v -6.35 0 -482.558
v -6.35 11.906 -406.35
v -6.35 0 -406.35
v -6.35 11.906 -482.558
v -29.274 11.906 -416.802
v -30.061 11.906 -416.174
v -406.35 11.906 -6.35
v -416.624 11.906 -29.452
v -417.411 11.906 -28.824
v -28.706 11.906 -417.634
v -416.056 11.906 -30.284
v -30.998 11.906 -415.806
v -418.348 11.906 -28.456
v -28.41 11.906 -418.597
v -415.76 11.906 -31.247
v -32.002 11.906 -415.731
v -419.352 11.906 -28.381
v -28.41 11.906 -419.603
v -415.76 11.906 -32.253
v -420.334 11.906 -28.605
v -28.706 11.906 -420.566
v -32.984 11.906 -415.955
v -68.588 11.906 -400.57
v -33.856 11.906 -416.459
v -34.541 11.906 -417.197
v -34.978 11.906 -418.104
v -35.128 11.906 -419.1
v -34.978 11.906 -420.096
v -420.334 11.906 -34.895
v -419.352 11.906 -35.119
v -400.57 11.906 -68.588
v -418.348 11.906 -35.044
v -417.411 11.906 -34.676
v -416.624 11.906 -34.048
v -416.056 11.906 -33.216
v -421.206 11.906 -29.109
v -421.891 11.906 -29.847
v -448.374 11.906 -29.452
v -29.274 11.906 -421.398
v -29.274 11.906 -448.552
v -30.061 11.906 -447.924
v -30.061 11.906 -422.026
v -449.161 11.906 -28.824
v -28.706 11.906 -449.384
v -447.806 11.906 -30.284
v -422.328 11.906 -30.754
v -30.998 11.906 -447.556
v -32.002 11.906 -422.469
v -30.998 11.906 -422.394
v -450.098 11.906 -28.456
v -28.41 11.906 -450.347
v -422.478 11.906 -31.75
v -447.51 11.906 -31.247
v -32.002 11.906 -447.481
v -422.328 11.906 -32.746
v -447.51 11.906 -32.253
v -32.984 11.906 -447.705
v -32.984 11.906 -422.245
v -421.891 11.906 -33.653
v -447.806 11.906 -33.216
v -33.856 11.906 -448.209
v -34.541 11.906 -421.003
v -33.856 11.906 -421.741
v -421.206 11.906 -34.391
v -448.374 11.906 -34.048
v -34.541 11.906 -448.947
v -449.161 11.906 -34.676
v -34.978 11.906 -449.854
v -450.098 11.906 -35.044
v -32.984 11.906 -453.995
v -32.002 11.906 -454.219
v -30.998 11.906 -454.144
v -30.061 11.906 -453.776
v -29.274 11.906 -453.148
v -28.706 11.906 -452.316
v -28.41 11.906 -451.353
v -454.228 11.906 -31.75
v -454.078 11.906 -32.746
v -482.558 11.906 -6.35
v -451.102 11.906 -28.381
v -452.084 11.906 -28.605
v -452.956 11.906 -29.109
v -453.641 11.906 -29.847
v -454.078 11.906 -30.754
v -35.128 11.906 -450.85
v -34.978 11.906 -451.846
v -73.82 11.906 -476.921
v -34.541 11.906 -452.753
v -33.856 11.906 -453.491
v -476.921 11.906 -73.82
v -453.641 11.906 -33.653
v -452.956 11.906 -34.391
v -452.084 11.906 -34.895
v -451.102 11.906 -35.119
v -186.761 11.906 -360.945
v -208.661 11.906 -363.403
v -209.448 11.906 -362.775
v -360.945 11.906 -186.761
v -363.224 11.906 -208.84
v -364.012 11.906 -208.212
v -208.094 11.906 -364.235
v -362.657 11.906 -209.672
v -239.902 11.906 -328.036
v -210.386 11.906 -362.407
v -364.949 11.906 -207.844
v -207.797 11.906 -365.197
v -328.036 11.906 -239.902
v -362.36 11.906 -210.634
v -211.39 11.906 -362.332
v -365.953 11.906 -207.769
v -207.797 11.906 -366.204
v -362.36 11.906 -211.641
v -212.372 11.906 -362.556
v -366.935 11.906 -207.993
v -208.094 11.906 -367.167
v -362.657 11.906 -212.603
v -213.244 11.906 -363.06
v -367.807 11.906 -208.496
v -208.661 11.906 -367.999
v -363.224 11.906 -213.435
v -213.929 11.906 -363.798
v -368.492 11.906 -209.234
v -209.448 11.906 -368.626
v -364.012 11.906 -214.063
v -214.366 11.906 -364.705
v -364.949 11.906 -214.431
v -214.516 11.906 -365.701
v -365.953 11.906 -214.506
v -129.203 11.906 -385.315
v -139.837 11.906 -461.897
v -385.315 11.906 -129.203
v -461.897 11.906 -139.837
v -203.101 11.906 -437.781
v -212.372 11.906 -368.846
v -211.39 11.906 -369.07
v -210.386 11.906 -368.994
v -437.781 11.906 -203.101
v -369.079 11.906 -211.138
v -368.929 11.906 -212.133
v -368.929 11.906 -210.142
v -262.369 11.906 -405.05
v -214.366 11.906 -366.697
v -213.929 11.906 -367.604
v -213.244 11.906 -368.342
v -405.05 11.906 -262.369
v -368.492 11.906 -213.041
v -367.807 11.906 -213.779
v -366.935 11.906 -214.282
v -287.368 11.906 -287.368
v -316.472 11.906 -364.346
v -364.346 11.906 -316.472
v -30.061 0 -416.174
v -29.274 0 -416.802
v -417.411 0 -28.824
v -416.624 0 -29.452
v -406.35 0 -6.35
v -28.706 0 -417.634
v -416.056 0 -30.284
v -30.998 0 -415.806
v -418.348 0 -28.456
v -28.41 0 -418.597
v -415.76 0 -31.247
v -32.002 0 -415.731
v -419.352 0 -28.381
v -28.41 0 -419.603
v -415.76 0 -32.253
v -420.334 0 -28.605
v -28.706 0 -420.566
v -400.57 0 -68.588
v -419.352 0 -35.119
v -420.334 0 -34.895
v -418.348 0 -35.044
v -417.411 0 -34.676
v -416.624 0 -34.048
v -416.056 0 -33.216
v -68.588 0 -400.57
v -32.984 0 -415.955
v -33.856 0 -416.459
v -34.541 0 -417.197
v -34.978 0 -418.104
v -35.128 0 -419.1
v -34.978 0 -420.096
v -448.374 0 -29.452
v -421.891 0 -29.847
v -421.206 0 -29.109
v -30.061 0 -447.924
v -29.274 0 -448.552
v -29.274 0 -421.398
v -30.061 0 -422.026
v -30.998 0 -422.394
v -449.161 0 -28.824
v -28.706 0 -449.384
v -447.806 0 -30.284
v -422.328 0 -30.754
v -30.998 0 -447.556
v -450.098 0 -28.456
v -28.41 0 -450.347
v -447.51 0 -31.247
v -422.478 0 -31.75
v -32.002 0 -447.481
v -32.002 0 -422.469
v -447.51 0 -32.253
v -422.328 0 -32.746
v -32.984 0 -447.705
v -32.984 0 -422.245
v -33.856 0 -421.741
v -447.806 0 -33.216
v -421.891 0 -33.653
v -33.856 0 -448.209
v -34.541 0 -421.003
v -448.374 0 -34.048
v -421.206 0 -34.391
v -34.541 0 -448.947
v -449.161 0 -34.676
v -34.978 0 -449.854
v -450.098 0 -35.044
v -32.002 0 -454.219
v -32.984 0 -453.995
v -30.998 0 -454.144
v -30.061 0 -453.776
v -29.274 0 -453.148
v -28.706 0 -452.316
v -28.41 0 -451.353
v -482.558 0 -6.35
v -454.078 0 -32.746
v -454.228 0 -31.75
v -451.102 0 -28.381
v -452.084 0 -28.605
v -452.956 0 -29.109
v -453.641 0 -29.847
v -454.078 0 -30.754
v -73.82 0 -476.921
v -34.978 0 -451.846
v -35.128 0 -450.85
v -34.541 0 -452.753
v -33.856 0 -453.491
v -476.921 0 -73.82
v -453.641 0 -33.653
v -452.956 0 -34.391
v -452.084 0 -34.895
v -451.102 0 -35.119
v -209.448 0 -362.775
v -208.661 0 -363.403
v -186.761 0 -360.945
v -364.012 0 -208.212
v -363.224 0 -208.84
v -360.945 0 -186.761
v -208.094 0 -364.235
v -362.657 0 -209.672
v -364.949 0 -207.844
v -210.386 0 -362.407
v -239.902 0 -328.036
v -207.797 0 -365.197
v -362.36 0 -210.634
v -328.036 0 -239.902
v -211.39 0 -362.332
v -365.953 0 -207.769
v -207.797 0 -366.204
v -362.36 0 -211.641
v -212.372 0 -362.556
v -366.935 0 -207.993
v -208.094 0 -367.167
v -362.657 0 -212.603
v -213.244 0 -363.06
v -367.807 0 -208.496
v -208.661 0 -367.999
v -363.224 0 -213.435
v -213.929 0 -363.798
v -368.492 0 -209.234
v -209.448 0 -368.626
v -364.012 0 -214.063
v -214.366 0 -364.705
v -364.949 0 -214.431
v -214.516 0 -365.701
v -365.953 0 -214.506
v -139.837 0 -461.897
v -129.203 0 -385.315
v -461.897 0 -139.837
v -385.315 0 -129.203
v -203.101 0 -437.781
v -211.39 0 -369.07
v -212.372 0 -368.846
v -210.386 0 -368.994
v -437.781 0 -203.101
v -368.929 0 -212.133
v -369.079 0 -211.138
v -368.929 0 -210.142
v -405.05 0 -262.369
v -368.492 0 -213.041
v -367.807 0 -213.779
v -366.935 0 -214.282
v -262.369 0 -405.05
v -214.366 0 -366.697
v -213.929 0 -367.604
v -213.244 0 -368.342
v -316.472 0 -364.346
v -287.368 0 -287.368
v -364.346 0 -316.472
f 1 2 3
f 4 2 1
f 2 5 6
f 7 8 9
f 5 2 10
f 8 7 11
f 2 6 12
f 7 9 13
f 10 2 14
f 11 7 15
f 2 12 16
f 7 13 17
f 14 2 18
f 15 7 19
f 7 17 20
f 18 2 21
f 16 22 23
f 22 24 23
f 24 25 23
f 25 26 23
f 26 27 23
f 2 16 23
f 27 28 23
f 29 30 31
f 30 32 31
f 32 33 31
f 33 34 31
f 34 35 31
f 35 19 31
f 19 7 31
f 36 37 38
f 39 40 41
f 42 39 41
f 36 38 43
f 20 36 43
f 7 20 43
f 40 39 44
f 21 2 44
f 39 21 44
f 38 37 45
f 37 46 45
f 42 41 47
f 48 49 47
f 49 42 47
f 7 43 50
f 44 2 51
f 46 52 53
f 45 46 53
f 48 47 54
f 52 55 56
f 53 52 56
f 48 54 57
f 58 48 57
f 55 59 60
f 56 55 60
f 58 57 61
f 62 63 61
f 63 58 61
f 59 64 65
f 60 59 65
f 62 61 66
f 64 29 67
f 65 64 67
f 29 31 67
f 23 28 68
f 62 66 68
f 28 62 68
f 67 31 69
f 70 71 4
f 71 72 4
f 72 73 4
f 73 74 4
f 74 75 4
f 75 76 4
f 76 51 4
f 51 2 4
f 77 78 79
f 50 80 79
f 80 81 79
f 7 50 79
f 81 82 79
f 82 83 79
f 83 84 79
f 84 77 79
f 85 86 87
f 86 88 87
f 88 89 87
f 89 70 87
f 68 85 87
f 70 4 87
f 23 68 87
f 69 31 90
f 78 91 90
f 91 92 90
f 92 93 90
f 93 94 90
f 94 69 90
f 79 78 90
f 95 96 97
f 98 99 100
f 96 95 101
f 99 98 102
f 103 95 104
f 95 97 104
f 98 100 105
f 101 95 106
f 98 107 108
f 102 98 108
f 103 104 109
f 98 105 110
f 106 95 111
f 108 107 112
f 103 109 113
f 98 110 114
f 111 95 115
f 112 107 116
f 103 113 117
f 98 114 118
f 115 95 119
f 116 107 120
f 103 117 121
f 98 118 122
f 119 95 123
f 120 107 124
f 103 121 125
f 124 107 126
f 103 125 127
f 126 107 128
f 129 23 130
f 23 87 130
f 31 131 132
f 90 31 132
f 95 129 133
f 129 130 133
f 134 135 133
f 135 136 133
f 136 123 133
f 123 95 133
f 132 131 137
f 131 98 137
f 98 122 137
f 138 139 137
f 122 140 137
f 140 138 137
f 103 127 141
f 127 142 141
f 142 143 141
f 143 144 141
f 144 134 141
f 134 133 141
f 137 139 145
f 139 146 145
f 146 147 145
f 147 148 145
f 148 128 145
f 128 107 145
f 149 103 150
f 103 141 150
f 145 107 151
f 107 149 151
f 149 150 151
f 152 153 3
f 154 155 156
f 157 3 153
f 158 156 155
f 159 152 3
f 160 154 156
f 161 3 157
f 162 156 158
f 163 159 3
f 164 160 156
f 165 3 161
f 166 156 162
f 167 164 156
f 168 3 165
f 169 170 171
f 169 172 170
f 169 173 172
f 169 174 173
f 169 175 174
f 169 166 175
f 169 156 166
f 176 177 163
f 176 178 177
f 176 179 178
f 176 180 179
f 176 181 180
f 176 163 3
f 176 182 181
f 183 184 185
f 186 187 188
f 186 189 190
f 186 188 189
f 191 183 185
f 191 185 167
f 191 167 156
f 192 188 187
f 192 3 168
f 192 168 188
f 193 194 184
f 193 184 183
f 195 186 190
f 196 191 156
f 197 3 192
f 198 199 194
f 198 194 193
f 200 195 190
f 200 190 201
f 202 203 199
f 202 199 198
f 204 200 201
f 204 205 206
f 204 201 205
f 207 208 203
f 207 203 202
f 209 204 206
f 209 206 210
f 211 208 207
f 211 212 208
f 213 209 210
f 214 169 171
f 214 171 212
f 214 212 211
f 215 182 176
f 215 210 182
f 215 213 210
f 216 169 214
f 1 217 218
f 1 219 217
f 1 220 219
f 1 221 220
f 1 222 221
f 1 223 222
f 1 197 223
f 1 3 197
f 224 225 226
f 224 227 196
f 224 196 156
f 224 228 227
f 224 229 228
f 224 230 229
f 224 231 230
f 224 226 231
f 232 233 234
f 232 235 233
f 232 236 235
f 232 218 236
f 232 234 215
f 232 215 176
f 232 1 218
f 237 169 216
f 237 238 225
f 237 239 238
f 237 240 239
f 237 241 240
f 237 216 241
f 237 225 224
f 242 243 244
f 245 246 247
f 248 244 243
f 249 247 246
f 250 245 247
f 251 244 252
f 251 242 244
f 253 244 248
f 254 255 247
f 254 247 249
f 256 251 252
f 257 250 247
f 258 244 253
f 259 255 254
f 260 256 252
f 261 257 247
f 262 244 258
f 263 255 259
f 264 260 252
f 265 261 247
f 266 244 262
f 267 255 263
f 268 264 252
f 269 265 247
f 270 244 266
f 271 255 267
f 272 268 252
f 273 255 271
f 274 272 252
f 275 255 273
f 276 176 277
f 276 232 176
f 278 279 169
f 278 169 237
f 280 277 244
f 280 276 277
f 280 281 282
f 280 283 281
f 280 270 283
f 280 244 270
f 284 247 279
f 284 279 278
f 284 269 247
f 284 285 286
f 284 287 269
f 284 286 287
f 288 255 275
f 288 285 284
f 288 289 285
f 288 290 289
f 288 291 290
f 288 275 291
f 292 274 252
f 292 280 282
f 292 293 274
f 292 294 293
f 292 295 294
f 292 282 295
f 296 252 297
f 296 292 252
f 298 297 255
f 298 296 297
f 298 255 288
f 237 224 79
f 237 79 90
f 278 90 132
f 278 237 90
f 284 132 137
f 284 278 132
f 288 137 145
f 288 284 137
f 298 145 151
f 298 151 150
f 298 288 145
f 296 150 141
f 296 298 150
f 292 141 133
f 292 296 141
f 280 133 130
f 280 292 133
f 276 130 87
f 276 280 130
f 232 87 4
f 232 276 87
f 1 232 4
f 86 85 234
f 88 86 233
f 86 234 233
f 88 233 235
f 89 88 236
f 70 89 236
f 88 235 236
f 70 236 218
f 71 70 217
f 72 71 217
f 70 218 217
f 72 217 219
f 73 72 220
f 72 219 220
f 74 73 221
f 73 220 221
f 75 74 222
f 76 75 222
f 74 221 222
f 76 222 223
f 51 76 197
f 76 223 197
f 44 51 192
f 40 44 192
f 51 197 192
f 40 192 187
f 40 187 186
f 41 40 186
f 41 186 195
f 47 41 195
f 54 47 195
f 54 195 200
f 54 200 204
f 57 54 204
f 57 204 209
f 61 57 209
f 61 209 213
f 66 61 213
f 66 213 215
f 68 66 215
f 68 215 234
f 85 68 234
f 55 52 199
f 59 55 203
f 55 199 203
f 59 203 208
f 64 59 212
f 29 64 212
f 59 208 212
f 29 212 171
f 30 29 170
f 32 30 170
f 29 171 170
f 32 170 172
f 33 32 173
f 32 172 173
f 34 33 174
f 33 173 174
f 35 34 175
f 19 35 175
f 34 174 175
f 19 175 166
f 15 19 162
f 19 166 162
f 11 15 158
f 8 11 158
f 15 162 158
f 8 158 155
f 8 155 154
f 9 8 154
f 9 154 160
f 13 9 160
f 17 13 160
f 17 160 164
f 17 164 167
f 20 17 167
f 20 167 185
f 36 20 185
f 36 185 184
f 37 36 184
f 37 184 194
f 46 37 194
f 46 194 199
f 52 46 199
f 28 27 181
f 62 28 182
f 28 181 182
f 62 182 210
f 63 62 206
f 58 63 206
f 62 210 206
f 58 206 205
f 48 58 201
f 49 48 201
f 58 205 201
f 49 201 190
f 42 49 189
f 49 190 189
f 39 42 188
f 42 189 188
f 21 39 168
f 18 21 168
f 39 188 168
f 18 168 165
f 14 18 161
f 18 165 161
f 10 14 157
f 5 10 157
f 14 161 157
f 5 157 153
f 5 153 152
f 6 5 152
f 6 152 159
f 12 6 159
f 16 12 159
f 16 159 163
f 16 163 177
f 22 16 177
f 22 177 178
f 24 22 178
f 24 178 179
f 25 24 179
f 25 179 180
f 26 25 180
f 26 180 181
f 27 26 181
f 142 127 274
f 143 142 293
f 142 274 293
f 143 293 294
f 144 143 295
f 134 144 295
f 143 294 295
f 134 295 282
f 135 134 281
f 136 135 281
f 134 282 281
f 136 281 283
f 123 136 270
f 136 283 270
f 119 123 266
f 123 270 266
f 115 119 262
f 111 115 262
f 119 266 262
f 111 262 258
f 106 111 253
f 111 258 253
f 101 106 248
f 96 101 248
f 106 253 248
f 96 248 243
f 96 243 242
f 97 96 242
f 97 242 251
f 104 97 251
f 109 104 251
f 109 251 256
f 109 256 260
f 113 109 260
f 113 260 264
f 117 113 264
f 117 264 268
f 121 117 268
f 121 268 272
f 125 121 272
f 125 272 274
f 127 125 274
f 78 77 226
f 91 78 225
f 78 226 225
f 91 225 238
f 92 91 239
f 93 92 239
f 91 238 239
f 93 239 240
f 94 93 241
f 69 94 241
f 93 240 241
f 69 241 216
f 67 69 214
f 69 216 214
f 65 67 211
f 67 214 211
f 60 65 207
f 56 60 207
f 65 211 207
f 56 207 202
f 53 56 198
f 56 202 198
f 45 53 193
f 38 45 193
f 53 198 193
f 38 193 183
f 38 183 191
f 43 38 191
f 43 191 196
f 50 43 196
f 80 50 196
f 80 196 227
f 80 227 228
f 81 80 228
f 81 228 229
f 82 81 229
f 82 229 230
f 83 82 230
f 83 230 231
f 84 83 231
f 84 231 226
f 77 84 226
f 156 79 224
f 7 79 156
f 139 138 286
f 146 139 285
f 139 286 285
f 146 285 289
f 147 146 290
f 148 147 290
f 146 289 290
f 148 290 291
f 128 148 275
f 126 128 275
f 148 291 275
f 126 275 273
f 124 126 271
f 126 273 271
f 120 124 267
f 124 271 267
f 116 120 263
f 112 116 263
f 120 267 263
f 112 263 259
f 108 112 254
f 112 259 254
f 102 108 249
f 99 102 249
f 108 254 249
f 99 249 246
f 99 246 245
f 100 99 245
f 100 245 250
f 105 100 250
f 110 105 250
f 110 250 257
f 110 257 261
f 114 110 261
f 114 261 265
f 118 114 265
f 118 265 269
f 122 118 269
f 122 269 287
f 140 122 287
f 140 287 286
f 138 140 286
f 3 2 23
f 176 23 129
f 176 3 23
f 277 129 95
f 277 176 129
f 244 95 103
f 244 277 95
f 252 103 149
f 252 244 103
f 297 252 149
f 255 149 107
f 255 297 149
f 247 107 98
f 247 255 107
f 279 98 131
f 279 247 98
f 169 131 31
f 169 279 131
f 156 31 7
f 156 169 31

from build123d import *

# Parameters (mm, degrees)
BOSS_EXTRUDE1_DEPTH     = 11.90625
SKETCH2_W               = 12.7
SKETCH2_H               = 38.149612403
SKETCH2_W_2             = 38.149612403
SKETCH2_H_2             = 12.7
CUT_EXTRUDE1_DEPTH      = 683.603309975
F_1_4_CLEARANCE_HOLE1_D = 6.7564
SKETCH8_W               = 482.6
SKETCH8_H               = 482.6
CUT_EXTRUDE4_DEPTH      = 683.603309975
SKETCH12_W              = 6.35
SKETCH12_H              = 76.249612403
SKETCH12_W_2            = 76.249612403
SKETCH12_H_2            = 6.35
CUT_EXTRUDE6_DEPTH      = 683.603309975


with BuildPart() as part:
    # Sketch1 → Boss-Extrude1 (new body)
    with BuildSketch(Plane(origin=(0, 0, 0), x_dir=(1, 0, 0), z_dir=(0, 1, 0))):
        with BuildLine():
            Line((-406.4, 0), (-482.6, 0))
            ThreePointArc((-482.6, 0), (0, 482.6), (482.6, 0))
            Line((482.6, 0), (406.4, 0))
            ThreePointArc((406.4, 0), (0, 406.4), (-406.4, 0))
        make_face()
    extrude(amount=BOSS_EXTRUDE1_DEPTH)

    # Sketch2 → Cut-Extrude1 (cut, through all)
    with BuildSketch(Plane(origin=(0, 11.90625, 0), x_dir=(1, 0, 0), z_dir=(0, 1, 0))):
        with Locations((0, 425.425193799)):
            Rectangle(SKETCH2_W, SKETCH2_H)
        with Locations((425.425193799, 0)):
            Rectangle(SKETCH2_W_2, SKETCH2_H_2)
        with Locations((0, -425.425193799)):
            Rectangle(SKETCH2_W, SKETCH2_H)
        with Locations((-425.425193799, 0)):
            Rectangle(SKETCH2_W_2, SKETCH2_H_2)
    extrude(amount=-CUT_EXTRUDE1_DEPTH, mode=Mode.SUBTRACT)

    # 1/4 Clearance Hole1 (through all)
    with Locations(Plane(origin=(0, 11.90625, 0), x_dir=(1, 0, 0), z_dir=(0, 1, 0))):
        with Locations((-365.700877383, 211.1375), (-31.75, 419.1), (-31.75, 450.85), (-419.1, 31.75), (-450.85, 31.75), (-211.1375, 365.700877383)):
            Hole(F_1_4_CLEARANCE_HOLE1_D / 2)

    # Sketch8 → Cut-Extrude4 (cut, through all)
    with BuildSketch(Plane(origin=(0, 11.90625, 0), x_dir=(1, 0, 0), z_dir=(0, 1, 0))):
        with Locations((241.3, 241.3)):
            Rectangle(SKETCH8_W, SKETCH8_H)
    extrude(amount=-CUT_EXTRUDE4_DEPTH, mode=Mode.SUBTRACT)

    # Sketch12 → Cut-Extrude6 (cut, through all)
    with BuildSketch(Plane(origin=(0, 11.90625, 0), x_dir=(1, 0, 0), z_dir=(0, 1, 0))):
        with Locations((-3.175, 444.475193799)):
            Rectangle(SKETCH12_W, SKETCH12_H)
        with Locations((-444.475193799, 3.175)):
            Rectangle(SKETCH12_W_2, SKETCH12_H_2)
    extrude(amount=-CUT_EXTRUDE6_DEPTH, mode=Mode.SUBTRACT)


solid = part.part
